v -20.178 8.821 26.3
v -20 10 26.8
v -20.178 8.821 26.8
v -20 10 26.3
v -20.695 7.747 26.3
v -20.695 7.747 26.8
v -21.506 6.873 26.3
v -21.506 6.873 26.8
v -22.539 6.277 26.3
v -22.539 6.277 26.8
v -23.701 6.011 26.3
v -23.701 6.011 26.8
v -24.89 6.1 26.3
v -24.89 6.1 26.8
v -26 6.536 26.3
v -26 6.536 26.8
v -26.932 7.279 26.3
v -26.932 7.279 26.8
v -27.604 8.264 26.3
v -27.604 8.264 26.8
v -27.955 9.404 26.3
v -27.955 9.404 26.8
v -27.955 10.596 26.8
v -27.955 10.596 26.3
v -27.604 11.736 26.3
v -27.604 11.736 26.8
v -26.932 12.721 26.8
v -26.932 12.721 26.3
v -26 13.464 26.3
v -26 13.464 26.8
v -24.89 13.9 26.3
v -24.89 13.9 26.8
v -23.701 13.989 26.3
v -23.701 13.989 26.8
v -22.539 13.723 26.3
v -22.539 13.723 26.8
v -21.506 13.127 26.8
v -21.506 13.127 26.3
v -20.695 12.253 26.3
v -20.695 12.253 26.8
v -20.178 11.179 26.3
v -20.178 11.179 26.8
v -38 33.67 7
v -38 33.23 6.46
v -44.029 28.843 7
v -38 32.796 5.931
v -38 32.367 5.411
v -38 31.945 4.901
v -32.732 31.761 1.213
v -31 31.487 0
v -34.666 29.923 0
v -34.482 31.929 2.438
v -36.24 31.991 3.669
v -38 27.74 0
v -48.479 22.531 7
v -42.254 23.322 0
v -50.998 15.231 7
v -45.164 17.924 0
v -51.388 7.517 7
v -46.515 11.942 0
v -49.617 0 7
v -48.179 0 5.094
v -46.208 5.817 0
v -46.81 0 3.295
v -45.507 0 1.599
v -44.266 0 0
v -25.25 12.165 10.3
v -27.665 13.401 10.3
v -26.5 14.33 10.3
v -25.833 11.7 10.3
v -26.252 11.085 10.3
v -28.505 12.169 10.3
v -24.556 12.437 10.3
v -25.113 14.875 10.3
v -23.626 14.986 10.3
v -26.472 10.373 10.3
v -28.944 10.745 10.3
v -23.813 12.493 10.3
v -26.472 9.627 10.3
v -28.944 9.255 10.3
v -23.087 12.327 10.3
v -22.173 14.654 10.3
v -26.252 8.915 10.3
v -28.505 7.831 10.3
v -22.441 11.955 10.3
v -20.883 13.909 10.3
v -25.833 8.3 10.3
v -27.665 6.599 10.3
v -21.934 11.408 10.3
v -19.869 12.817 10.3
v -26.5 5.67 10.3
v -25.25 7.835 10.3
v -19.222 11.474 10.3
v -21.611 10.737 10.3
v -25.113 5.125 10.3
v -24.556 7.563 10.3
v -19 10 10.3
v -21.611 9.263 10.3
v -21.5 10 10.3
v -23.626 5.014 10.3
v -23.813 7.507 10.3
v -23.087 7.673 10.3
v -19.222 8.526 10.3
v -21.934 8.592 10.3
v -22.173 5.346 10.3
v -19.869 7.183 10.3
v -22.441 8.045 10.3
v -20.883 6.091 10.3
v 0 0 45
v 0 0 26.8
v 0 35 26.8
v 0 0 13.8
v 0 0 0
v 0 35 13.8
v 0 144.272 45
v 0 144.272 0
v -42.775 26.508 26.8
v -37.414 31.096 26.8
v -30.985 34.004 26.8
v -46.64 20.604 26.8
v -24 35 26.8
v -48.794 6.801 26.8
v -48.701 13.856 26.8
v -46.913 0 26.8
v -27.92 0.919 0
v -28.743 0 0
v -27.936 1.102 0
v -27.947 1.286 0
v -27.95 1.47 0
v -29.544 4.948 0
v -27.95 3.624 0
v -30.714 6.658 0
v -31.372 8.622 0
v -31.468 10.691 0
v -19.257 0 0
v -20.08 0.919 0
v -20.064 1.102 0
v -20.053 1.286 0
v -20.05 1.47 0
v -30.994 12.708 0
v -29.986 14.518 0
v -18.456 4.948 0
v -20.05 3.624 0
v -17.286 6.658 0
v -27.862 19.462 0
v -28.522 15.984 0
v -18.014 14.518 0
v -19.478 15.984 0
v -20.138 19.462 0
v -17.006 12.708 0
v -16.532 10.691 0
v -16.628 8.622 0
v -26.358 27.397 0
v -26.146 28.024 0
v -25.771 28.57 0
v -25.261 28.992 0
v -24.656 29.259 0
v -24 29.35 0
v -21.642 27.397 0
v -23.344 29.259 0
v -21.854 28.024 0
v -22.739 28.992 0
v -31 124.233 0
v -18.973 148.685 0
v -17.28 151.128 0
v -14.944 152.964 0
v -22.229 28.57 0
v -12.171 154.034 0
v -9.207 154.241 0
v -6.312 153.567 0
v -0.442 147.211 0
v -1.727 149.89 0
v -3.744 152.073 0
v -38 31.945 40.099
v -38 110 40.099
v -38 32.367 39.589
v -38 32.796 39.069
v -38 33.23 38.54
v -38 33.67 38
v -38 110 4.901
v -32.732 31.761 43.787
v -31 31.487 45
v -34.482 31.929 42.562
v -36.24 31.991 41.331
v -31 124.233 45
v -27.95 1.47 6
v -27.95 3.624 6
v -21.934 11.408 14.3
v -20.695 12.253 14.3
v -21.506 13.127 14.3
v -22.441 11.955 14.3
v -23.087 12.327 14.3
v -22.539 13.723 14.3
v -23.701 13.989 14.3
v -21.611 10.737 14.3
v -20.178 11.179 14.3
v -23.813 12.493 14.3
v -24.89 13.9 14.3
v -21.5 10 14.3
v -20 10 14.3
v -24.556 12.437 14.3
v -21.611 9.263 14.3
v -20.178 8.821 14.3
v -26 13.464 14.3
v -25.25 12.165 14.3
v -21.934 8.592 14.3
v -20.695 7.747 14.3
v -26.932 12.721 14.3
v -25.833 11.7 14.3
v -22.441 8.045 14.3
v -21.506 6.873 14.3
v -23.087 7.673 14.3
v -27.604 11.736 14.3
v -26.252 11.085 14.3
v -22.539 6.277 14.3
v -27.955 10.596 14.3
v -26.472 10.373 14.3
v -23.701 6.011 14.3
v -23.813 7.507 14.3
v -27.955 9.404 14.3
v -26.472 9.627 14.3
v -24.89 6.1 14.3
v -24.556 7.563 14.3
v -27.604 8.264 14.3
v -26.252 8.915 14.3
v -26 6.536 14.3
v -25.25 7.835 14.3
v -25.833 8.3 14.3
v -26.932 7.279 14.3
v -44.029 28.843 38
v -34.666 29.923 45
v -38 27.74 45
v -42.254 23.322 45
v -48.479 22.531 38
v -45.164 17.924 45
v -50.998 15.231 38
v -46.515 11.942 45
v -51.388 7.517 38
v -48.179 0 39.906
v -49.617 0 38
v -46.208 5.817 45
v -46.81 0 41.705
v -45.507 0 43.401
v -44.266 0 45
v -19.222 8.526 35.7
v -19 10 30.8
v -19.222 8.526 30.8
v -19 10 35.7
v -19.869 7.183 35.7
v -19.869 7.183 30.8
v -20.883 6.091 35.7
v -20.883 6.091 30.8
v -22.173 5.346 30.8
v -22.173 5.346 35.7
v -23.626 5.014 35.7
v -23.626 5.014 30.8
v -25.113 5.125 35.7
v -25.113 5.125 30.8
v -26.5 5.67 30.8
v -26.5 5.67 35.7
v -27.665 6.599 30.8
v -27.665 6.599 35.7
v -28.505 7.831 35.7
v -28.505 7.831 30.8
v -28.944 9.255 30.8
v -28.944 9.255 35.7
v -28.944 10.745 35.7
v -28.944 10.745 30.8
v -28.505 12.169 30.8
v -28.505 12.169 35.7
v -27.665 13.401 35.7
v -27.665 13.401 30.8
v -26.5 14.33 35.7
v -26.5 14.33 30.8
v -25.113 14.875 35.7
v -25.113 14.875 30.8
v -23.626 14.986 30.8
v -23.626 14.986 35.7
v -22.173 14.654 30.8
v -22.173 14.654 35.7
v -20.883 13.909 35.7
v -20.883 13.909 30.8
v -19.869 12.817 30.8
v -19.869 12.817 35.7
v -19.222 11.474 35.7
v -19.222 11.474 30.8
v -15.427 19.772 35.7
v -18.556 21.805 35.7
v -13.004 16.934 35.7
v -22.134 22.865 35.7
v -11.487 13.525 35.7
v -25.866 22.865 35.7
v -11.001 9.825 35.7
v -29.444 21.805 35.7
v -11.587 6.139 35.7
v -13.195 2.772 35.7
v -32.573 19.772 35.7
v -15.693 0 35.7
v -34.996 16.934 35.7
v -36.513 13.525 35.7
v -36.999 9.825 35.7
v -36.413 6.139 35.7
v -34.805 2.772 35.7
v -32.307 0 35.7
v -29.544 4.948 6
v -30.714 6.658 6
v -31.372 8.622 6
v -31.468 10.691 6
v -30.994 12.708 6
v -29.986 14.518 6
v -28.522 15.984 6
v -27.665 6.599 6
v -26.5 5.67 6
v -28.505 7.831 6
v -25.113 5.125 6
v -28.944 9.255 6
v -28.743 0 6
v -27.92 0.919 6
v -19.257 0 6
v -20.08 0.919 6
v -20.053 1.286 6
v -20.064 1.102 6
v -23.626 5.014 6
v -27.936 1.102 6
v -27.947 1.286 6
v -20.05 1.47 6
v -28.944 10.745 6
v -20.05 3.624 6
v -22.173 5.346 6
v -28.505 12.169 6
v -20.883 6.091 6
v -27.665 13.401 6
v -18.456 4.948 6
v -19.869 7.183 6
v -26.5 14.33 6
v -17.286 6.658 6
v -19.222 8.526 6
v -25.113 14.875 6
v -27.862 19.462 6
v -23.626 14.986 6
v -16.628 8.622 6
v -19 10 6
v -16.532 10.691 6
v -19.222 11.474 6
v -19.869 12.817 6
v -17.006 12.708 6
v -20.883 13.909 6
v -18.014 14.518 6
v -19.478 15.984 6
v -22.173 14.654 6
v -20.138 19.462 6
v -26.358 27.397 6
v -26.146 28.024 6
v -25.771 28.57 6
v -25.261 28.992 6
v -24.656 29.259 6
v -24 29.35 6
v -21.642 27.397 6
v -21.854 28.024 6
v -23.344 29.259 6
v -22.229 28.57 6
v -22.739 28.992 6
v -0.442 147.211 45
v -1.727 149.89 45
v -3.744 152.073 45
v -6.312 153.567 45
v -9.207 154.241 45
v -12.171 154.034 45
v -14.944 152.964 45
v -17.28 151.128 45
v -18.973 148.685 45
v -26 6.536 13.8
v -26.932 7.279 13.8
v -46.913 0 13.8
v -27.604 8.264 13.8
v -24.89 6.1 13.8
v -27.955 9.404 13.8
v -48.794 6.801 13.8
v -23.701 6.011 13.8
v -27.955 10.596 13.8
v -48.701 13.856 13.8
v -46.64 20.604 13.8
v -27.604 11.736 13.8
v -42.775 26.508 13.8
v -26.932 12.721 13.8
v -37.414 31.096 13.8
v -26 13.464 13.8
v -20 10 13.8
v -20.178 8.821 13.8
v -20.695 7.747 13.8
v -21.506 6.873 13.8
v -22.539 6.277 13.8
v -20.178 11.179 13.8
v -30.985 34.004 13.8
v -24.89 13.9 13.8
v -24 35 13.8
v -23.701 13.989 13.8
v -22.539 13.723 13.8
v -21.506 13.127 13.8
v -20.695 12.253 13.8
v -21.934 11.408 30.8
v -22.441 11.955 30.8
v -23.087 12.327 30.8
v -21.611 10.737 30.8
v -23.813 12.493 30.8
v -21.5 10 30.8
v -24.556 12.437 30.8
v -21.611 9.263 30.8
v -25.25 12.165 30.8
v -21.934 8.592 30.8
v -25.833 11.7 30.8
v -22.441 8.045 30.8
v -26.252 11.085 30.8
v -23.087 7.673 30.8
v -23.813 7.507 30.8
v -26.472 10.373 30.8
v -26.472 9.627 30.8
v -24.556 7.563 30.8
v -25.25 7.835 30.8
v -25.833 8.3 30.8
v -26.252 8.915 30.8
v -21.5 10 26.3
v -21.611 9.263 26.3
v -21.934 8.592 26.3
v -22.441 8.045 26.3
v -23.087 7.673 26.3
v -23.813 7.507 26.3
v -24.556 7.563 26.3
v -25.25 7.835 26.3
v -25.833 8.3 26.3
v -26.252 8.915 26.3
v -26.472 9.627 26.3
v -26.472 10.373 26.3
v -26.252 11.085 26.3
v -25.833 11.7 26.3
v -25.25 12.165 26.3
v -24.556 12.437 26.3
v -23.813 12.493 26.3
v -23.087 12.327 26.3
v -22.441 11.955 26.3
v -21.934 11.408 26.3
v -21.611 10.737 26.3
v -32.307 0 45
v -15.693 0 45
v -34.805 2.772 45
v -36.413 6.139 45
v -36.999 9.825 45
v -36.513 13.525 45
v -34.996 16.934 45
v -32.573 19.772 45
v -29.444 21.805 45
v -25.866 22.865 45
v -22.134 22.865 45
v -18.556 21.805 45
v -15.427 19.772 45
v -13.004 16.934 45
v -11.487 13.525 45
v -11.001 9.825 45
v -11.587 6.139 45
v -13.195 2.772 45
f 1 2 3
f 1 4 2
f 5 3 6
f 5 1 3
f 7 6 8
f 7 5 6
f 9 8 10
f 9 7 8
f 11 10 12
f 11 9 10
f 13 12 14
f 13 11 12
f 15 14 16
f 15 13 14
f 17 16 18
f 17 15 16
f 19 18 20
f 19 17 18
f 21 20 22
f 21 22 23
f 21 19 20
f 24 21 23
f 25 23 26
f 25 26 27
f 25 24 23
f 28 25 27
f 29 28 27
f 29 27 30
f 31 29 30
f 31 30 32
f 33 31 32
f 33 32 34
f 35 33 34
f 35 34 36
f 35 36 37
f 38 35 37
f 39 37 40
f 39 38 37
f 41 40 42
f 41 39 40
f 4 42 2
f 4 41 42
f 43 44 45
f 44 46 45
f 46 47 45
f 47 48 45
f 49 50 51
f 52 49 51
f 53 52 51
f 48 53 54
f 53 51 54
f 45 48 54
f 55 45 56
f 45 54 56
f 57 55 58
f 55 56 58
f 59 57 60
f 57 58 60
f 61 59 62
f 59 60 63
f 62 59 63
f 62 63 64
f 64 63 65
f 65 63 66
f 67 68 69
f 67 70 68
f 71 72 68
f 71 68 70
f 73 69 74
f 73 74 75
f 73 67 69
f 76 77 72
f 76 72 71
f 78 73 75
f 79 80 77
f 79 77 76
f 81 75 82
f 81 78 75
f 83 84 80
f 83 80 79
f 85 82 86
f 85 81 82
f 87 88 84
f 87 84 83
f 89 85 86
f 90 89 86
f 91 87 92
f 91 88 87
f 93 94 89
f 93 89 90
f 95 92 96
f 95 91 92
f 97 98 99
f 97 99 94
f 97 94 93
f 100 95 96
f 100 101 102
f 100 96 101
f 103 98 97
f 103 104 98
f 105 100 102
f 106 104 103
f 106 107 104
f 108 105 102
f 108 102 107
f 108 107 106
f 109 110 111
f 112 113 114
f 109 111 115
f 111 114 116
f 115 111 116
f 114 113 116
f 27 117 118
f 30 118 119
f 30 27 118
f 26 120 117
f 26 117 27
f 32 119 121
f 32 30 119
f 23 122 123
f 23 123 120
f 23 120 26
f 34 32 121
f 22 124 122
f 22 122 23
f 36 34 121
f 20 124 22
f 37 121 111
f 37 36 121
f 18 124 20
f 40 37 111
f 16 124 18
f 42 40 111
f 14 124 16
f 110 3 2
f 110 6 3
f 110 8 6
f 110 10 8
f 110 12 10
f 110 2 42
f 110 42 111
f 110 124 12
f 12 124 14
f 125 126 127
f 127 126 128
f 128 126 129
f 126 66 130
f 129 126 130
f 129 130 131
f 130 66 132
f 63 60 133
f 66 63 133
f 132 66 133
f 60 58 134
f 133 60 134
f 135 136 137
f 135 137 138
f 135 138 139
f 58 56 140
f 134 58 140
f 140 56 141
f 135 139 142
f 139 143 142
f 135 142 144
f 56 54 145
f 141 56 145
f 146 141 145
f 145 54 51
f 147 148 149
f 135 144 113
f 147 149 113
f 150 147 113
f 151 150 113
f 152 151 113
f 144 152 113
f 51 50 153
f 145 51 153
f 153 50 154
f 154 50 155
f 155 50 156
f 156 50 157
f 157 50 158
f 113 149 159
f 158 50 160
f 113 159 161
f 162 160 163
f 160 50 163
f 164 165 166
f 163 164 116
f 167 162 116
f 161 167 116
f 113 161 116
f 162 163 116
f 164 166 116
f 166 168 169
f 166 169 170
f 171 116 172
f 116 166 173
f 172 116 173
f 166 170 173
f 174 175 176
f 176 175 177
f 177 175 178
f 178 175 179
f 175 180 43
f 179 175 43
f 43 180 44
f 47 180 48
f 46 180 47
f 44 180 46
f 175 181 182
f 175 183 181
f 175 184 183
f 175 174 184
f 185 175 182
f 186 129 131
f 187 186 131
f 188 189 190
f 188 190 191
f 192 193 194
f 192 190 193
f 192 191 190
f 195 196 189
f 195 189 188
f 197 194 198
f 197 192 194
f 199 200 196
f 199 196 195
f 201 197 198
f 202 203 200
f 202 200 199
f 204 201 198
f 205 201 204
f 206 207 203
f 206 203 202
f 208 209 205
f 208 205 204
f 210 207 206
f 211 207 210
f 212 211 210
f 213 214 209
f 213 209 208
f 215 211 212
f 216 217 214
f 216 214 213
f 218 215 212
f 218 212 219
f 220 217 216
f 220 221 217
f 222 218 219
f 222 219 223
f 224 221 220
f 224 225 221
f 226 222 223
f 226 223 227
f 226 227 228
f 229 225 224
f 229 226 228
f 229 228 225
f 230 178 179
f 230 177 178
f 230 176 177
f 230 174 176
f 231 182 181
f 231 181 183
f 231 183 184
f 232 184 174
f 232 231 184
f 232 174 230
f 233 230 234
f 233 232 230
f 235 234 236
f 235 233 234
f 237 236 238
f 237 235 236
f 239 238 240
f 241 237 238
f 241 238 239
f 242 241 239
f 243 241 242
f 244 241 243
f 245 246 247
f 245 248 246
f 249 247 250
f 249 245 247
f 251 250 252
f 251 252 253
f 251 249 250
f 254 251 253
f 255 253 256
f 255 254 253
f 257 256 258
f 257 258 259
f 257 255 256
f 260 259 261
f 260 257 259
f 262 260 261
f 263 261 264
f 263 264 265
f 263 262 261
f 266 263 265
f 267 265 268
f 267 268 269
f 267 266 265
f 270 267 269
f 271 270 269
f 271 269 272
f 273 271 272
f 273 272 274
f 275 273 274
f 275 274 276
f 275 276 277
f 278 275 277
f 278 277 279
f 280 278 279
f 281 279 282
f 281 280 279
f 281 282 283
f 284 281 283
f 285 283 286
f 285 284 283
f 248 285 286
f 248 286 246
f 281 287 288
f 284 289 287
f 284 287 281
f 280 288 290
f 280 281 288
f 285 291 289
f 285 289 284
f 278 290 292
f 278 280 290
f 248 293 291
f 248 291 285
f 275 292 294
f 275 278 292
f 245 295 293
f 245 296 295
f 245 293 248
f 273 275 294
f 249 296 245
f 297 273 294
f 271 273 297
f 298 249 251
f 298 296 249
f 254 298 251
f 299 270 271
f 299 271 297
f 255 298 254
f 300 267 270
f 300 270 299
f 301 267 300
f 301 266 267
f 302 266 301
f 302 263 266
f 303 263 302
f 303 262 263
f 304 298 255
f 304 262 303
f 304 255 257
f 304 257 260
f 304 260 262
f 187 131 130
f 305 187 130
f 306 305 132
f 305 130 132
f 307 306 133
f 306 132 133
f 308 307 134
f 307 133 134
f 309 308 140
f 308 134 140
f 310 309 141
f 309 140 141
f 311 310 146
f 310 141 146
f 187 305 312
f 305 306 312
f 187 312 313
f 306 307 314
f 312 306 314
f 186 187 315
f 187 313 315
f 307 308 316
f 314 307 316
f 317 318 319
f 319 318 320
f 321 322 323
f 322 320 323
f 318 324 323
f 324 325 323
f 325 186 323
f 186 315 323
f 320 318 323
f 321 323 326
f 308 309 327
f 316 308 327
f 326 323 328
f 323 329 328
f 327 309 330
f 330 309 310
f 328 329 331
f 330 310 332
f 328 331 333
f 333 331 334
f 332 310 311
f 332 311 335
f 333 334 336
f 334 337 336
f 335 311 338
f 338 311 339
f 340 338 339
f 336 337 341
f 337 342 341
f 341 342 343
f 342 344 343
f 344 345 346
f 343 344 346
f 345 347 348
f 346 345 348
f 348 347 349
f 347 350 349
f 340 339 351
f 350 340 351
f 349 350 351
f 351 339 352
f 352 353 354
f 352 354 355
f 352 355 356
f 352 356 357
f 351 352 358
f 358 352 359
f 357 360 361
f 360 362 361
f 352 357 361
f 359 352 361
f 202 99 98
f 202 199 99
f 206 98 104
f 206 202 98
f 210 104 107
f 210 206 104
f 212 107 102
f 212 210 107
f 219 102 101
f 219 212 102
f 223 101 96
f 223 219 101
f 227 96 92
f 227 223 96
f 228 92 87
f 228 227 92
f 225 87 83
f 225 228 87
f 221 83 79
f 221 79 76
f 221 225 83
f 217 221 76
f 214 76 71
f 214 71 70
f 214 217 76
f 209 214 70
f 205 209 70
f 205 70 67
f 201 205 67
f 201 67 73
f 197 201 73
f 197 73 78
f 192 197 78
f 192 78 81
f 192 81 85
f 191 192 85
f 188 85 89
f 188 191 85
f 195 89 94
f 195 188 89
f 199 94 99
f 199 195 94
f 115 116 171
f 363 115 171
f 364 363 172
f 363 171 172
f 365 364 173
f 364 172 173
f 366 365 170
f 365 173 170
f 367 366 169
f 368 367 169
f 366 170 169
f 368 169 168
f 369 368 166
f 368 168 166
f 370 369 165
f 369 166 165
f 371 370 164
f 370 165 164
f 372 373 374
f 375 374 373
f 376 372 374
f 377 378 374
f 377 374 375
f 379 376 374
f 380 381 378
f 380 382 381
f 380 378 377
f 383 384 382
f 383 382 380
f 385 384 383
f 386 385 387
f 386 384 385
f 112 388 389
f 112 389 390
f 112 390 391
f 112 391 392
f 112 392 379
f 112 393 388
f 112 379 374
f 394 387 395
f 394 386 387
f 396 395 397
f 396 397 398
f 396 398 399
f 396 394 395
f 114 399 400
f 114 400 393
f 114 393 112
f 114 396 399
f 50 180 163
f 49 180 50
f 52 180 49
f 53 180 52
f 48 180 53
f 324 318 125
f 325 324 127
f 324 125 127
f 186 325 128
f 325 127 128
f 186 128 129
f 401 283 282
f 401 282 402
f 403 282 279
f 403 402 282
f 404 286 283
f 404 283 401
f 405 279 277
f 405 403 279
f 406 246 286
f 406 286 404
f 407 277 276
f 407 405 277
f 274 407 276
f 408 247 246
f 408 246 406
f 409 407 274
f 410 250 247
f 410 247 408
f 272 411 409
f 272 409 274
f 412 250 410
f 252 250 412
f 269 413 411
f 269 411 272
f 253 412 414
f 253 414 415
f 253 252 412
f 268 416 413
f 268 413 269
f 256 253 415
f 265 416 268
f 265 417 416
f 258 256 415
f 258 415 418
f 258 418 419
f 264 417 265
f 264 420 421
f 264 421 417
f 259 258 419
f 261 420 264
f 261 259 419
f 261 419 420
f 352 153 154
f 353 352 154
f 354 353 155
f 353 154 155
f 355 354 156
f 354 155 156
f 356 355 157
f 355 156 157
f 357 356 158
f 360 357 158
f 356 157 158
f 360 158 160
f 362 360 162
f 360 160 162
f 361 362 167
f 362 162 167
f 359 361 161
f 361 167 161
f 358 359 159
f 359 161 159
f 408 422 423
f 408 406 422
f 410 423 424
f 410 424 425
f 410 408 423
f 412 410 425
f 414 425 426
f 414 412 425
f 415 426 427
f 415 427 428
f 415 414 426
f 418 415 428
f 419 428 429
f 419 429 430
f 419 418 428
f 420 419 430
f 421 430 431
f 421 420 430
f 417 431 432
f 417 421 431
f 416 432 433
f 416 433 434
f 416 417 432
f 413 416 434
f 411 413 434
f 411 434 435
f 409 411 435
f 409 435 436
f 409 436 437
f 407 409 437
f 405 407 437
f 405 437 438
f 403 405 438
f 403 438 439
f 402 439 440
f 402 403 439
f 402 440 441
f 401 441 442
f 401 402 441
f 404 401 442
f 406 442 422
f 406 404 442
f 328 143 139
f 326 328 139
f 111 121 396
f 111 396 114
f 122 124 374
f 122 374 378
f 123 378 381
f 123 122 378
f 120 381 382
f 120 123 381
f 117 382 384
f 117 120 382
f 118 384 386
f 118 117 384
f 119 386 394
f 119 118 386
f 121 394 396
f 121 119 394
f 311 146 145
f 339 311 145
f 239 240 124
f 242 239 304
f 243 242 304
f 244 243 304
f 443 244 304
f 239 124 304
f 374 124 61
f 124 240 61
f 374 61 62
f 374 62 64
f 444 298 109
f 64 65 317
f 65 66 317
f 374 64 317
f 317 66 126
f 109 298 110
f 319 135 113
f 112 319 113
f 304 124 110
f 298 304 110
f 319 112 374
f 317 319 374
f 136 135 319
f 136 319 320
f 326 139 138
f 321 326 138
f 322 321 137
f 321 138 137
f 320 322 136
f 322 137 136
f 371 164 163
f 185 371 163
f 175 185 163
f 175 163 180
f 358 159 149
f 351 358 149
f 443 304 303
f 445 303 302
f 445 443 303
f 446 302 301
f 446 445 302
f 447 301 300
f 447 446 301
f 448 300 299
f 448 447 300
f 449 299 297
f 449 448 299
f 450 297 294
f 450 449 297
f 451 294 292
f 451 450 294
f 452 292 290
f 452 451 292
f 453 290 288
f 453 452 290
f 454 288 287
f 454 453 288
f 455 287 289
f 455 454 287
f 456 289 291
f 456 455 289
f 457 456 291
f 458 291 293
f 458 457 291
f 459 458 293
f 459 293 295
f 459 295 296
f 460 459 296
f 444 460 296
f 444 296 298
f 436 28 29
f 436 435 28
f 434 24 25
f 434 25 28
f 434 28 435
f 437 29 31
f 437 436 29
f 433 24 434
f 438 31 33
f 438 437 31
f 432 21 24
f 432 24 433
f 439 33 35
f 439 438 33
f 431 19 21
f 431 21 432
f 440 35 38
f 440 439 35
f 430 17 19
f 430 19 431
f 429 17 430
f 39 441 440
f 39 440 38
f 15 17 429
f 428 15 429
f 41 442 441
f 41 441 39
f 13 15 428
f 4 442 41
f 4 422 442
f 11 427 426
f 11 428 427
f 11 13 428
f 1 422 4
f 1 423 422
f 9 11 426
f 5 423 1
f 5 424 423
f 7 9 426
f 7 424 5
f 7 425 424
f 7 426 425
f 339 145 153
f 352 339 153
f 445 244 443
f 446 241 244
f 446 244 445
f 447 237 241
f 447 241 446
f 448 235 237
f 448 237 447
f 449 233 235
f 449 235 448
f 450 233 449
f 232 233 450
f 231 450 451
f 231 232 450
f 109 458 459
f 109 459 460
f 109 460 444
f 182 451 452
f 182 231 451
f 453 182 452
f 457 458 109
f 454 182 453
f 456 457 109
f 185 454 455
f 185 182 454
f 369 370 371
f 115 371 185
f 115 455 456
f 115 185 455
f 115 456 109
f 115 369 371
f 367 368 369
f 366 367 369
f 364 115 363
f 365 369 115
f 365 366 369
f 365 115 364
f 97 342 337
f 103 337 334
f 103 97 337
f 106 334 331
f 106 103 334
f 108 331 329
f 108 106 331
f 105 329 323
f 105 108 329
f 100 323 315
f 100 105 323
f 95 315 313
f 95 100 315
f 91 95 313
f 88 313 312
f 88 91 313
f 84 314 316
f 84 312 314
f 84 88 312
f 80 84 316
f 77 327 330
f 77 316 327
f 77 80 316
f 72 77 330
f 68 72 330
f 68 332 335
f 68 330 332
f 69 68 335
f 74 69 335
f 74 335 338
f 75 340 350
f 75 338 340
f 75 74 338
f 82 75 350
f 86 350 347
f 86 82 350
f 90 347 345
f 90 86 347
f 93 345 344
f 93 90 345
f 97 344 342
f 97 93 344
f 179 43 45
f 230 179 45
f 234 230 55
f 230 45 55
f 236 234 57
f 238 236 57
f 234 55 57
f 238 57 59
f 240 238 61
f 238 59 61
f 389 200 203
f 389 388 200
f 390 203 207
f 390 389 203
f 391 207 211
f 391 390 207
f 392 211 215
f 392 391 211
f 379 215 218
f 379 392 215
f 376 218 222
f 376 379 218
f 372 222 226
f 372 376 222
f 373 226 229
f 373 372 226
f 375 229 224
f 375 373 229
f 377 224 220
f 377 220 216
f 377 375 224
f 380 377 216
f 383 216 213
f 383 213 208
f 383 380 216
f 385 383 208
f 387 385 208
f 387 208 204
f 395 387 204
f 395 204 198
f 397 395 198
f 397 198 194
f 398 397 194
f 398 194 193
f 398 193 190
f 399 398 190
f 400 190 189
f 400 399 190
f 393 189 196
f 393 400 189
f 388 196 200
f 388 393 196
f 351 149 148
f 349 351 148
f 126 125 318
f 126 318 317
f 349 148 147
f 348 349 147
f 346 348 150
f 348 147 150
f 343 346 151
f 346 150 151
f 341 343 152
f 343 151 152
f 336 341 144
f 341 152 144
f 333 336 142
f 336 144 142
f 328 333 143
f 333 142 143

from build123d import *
from OCP.BRepFilletAPI import BRepFilletAPI_MakeChamfer

# Parameters (mm, degrees)
EXTRUDE_1_DEPTH     = 45
CHAMFER_1_SIZE      = 7
CHAMFER_1_SIZE2     = 4.901452767
CUT_EXTRUDE_START   = 13
CUT_EXTRUDE_1_DEPTH = 13
CUT_EXTRUDE_2_DEPTH = 6
CUT_EXTRUDE_3_DEPTH = 6
CHAMFER_START       = -1
CHAMFER_2_DEPTH     = 7
CHAMFER_3_SIZE      = 7
CHAMFER_3_SIZE2     = 4.901452767


with BuildPart() as part:
    # 草图1 → 凸台-拉伸1 (new body)
    with BuildSketch(Plane.XY):
        with BuildLine():
            Line((0, 0), (0, 144.272111773))
            ThreePointArc((0, 144.272111773), (-7.734402303, 154.012084416), (-18.973413415, 148.68548369))
            Line((-18.973413415, 148.68548369), (-38, 110))
            Line((-38, 110), (-38, 33.669600757))
            ThreePointArc((-38, 33.669600757), (-49.996050511, 18.969691065), (-49.617376915, 0))
            Line((-49.617376915, 0), (0, 0))
        make_face()
    extrude(amount=EXTRUDE_1_DEPTH)

    # 草图2 → 切除-旋转2 (revolve, cut)
    with BuildSketch(Plane(origin=(-24, 0, 0), x_dir=(0, 0, -1), z_dir=(1, 0, 0)), mode=Mode.PRIVATE) as cut_revolve_2_sk:
        Polygon((-45, 23), (-45, 10), (0, 10), (0, 15), (-4.3, 15), (-10.3, 15), (-10.3, 12.5), (-14.3, 12.5), (-14.3, 14), (-13.8, 14), (-13.8, 35), (-26.8, 35), (-26.8, 14), (-26.3, 14), (-26.3, 12.5), (-30.8, 12.5), (-30.8, 15), (-35.7, 15), (-35.7, 23), align=None)
    revolve(cut_revolve_2_sk.sketch.rotate(Axis((-24, 10, 45), (0, 0, -1)), 90), axis=Axis((-24, 10, 45), (0, 0, -1)), mode=Mode.SUBTRACT)

    # 倒角1
    chamfer_1_edges = [part.edges().sort_by_distance(p)[0] for p in [
        (-49.996050511, 18.969691065, 45),
        (-49.996050511, 18.969691065, 0),
    ]]
    chamfer_1_side = [part.faces().sort_by_distance(p)[0] for p in [
        (-49.996050511, 18.969691065, 22.5),
    ]]
    chamfer(chamfer_1_edges, length=CHAMFER_1_SIZE, length2=CHAMFER_1_SIZE2, reference=chamfer_1_side[0])

    # 草图4 → 切除-拉伸1 (cut)
    with BuildSketch(Plane.XY.offset(13.8).offset(CUT_EXTRUDE_START)):
        with BuildLine():
            Line((-24, 35), (0, 35))
            Line((0, 35), (0, 17))
            ThreePointArc((0, 17), (-9, 30), (-24, 35))
        make_face()
        with BuildLine():
            Line((-1.087121525, 0), (0, 0))
            Line((0, 0), (0, 3))
            ThreePointArc((0, 3), (-0.495648452, 1.482637832), (-1.087121525, 0))
        make_face()
    extrude(amount=-CUT_EXTRUDE_1_DEPTH, mode=Mode.SUBTRACT)

    # 草图7 → 切除-拉伸2 (cut)
    with BuildSketch(Plane(origin=(0, 0, 0), x_dir=(-1, 0, 0), z_dir=(0, 0, -1))):
        with BuildLine():
            Line((27.95, 1.469792729), (27.95, 4.702830945))
            ThreePointArc((27.95, 4.702830945), (28.032732694, 5.101103075), (28.267241379, 5.433474952))
            ThreePointArc((28.267241379, 5.433474952), (30.25, 10), (28.267241379, 14.566525048))
            ThreePointArc((28.267241379, 14.566525048), (28.032732694, 14.898896925), (27.95, 15.297169055))
            Line((27.95, 15.297169055), (27.95, 18.530207271))
            ThreePointArc((27.95, 18.530207271), (27.928074545, 18.997939916), (27.862490469, 19.46157046))
            Line((27.862490469, 19.46157046), (26.357995425, 27.397054331))
            ThreePointArc((26.357995425, 27.397054331), (24, 29.35), (21.642004575, 27.397054331))
            Line((21.642004575, 27.397054331), (20.137509531, 19.46157046))
            ThreePointArc((20.137509531, 19.46157046), (20.071925455, 18.997939916), (20.05, 18.530207271))
            Line((20.05, 18.530207271), (20.05, 15.297169055))
            ThreePointArc((20.05, 15.297169055), (19.967267306, 14.898896925), (19.732758621, 14.566525048))
            ThreePointArc((19.732758621, 14.566525048), (17.75, 10), (19.732758621, 5.433474952))
            ThreePointArc((19.732758621, 5.433474952), (19.967267306, 5.101103075), (20.05, 4.702830945))
            Line((20.05, 4.702830945), (20.05, 1.469792729))
            ThreePointArc((20.05, 1.469792729), (20.071925455, 1.002060084), (20.137509531, 0.53842954))
            Line((20.137509531, 0.53842954), (21.642004575, -7.397054331))
            ThreePointArc((21.642004575, -7.397054331), (24, -9.35), (26.357995425, -7.397054331))
            Line((26.357995425, -7.397054331), (27.862490469, 0.53842954))
            ThreePointArc((27.862490469, 0.53842954), (27.928074545, 1.002060084), (27.95, 1.469792729))
        make_face()
    extrude(amount=-CUT_EXTRUDE_2_DEPTH, mode=Mode.SUBTRACT)

    # 草图9 → 切除-拉伸3 (cut)
    with BuildSketch(Plane(origin=(0, 0, 0), x_dir=(-1, 0, 0), z_dir=(0, 0, -1))):
        with BuildLine():
            Line((20.137509531, 19.46157046), (19.478101846, 15.983513774))
            ThreePointArc((19.478101846, 15.983513774), (16.508016808, 9.653318796), (20.05, 3.624460807))
            Line((20.05, 3.624460807), (27.95, 3.624460807))
            ThreePointArc((27.95, 3.624460807), (31.491983192, 9.653318796), (28.521898154, 15.983513774))
            Line((28.521898154, 15.983513774), (27.862490469, 19.46157046))
            Line((27.862490469, 19.46157046), (20.137509531, 19.46157046))
        make_face()
    extrude(amount=-CUT_EXTRUDE_3_DEPTH, mode=Mode.SUBTRACT)

    # 倒角2: read off the stored shape, not the designer's step
    # 倒角2 outline → 倒角2 (cut)
    with BuildSketch(Plane.XY.offset(CHAMFER_START)):
        with BuildLine():
            Line((-20.239590839, 0), (-19.257196744, 0))
            Line((-19.257196744, 0), (-20.080386265, 0.919393486))
            ThreePointArc((-20.080386265, 0.919393486), (-20.105277636, 0.728361179), (-20.137509531, 0.53842954))
            Line((-20.137509531, 0.53842954), (-20.239590839, 0))
        make_face()
        with BuildLine():
            Line((-28.742803256, 0), (-27.760409161, 0))
            Line((-27.760409161, 0), (-27.862490469, 0.53842954))
            ThreePointArc((-27.862490469, 0.53842954), (-27.894722364, 0.728361179), (-27.919613735, 0.919393486))
            Line((-27.919613735, 0.919393486), (-28.742803256, 0))
        make_face()
    extrude(amount=CHAMFER_2_DEPTH, mode=Mode.SUBTRACT)

    # 倒角3: one chamfer whose edges measure the first distance from different faces: ONE call of the kernel's chamfer builder (chamfer() names one face for all edges)
    chamfer_3_edges_1 = [part.edges().sort_by_distance(p)[0] for p in [
        (-38, 68.86981309, 45),
    ]]
    chamfer_3_side_1 = [part.faces().sort_by_distance(p)[0] for p in [
        (-18.29172725, 74.905702605, 45),
    ]]
    chamfer_3_edges_2 = [part.edges().sort_by_distance(p)[0] for p in [
        (-38, 68.86981309, 0),
    ]]
    chamfer_3_side_2 = [part.faces().sort_by_distance(p)[0] for p in [
        (-18.531236566, 72.11524923, 0),
    ]]
    chamfer_3 = BRepFilletAPI_MakeChamfer(part.part.solid().wrapped)
    for e in chamfer_3_edges_1:
        chamfer_3.Add(CHAMFER_3_SIZE, CHAMFER_3_SIZE2, e.wrapped, chamfer_3_side_1[0].wrapped)  # the first distance lies on this face
    for e in chamfer_3_edges_2:
        chamfer_3.Add(CHAMFER_3_SIZE, CHAMFER_3_SIZE2, e.wrapped, chamfer_3_side_2[0].wrapped)  # the first distance lies on this face
    add(Compound.cast(chamfer_3.Shape()), mode=Mode.REPLACE)


solid = part.part
